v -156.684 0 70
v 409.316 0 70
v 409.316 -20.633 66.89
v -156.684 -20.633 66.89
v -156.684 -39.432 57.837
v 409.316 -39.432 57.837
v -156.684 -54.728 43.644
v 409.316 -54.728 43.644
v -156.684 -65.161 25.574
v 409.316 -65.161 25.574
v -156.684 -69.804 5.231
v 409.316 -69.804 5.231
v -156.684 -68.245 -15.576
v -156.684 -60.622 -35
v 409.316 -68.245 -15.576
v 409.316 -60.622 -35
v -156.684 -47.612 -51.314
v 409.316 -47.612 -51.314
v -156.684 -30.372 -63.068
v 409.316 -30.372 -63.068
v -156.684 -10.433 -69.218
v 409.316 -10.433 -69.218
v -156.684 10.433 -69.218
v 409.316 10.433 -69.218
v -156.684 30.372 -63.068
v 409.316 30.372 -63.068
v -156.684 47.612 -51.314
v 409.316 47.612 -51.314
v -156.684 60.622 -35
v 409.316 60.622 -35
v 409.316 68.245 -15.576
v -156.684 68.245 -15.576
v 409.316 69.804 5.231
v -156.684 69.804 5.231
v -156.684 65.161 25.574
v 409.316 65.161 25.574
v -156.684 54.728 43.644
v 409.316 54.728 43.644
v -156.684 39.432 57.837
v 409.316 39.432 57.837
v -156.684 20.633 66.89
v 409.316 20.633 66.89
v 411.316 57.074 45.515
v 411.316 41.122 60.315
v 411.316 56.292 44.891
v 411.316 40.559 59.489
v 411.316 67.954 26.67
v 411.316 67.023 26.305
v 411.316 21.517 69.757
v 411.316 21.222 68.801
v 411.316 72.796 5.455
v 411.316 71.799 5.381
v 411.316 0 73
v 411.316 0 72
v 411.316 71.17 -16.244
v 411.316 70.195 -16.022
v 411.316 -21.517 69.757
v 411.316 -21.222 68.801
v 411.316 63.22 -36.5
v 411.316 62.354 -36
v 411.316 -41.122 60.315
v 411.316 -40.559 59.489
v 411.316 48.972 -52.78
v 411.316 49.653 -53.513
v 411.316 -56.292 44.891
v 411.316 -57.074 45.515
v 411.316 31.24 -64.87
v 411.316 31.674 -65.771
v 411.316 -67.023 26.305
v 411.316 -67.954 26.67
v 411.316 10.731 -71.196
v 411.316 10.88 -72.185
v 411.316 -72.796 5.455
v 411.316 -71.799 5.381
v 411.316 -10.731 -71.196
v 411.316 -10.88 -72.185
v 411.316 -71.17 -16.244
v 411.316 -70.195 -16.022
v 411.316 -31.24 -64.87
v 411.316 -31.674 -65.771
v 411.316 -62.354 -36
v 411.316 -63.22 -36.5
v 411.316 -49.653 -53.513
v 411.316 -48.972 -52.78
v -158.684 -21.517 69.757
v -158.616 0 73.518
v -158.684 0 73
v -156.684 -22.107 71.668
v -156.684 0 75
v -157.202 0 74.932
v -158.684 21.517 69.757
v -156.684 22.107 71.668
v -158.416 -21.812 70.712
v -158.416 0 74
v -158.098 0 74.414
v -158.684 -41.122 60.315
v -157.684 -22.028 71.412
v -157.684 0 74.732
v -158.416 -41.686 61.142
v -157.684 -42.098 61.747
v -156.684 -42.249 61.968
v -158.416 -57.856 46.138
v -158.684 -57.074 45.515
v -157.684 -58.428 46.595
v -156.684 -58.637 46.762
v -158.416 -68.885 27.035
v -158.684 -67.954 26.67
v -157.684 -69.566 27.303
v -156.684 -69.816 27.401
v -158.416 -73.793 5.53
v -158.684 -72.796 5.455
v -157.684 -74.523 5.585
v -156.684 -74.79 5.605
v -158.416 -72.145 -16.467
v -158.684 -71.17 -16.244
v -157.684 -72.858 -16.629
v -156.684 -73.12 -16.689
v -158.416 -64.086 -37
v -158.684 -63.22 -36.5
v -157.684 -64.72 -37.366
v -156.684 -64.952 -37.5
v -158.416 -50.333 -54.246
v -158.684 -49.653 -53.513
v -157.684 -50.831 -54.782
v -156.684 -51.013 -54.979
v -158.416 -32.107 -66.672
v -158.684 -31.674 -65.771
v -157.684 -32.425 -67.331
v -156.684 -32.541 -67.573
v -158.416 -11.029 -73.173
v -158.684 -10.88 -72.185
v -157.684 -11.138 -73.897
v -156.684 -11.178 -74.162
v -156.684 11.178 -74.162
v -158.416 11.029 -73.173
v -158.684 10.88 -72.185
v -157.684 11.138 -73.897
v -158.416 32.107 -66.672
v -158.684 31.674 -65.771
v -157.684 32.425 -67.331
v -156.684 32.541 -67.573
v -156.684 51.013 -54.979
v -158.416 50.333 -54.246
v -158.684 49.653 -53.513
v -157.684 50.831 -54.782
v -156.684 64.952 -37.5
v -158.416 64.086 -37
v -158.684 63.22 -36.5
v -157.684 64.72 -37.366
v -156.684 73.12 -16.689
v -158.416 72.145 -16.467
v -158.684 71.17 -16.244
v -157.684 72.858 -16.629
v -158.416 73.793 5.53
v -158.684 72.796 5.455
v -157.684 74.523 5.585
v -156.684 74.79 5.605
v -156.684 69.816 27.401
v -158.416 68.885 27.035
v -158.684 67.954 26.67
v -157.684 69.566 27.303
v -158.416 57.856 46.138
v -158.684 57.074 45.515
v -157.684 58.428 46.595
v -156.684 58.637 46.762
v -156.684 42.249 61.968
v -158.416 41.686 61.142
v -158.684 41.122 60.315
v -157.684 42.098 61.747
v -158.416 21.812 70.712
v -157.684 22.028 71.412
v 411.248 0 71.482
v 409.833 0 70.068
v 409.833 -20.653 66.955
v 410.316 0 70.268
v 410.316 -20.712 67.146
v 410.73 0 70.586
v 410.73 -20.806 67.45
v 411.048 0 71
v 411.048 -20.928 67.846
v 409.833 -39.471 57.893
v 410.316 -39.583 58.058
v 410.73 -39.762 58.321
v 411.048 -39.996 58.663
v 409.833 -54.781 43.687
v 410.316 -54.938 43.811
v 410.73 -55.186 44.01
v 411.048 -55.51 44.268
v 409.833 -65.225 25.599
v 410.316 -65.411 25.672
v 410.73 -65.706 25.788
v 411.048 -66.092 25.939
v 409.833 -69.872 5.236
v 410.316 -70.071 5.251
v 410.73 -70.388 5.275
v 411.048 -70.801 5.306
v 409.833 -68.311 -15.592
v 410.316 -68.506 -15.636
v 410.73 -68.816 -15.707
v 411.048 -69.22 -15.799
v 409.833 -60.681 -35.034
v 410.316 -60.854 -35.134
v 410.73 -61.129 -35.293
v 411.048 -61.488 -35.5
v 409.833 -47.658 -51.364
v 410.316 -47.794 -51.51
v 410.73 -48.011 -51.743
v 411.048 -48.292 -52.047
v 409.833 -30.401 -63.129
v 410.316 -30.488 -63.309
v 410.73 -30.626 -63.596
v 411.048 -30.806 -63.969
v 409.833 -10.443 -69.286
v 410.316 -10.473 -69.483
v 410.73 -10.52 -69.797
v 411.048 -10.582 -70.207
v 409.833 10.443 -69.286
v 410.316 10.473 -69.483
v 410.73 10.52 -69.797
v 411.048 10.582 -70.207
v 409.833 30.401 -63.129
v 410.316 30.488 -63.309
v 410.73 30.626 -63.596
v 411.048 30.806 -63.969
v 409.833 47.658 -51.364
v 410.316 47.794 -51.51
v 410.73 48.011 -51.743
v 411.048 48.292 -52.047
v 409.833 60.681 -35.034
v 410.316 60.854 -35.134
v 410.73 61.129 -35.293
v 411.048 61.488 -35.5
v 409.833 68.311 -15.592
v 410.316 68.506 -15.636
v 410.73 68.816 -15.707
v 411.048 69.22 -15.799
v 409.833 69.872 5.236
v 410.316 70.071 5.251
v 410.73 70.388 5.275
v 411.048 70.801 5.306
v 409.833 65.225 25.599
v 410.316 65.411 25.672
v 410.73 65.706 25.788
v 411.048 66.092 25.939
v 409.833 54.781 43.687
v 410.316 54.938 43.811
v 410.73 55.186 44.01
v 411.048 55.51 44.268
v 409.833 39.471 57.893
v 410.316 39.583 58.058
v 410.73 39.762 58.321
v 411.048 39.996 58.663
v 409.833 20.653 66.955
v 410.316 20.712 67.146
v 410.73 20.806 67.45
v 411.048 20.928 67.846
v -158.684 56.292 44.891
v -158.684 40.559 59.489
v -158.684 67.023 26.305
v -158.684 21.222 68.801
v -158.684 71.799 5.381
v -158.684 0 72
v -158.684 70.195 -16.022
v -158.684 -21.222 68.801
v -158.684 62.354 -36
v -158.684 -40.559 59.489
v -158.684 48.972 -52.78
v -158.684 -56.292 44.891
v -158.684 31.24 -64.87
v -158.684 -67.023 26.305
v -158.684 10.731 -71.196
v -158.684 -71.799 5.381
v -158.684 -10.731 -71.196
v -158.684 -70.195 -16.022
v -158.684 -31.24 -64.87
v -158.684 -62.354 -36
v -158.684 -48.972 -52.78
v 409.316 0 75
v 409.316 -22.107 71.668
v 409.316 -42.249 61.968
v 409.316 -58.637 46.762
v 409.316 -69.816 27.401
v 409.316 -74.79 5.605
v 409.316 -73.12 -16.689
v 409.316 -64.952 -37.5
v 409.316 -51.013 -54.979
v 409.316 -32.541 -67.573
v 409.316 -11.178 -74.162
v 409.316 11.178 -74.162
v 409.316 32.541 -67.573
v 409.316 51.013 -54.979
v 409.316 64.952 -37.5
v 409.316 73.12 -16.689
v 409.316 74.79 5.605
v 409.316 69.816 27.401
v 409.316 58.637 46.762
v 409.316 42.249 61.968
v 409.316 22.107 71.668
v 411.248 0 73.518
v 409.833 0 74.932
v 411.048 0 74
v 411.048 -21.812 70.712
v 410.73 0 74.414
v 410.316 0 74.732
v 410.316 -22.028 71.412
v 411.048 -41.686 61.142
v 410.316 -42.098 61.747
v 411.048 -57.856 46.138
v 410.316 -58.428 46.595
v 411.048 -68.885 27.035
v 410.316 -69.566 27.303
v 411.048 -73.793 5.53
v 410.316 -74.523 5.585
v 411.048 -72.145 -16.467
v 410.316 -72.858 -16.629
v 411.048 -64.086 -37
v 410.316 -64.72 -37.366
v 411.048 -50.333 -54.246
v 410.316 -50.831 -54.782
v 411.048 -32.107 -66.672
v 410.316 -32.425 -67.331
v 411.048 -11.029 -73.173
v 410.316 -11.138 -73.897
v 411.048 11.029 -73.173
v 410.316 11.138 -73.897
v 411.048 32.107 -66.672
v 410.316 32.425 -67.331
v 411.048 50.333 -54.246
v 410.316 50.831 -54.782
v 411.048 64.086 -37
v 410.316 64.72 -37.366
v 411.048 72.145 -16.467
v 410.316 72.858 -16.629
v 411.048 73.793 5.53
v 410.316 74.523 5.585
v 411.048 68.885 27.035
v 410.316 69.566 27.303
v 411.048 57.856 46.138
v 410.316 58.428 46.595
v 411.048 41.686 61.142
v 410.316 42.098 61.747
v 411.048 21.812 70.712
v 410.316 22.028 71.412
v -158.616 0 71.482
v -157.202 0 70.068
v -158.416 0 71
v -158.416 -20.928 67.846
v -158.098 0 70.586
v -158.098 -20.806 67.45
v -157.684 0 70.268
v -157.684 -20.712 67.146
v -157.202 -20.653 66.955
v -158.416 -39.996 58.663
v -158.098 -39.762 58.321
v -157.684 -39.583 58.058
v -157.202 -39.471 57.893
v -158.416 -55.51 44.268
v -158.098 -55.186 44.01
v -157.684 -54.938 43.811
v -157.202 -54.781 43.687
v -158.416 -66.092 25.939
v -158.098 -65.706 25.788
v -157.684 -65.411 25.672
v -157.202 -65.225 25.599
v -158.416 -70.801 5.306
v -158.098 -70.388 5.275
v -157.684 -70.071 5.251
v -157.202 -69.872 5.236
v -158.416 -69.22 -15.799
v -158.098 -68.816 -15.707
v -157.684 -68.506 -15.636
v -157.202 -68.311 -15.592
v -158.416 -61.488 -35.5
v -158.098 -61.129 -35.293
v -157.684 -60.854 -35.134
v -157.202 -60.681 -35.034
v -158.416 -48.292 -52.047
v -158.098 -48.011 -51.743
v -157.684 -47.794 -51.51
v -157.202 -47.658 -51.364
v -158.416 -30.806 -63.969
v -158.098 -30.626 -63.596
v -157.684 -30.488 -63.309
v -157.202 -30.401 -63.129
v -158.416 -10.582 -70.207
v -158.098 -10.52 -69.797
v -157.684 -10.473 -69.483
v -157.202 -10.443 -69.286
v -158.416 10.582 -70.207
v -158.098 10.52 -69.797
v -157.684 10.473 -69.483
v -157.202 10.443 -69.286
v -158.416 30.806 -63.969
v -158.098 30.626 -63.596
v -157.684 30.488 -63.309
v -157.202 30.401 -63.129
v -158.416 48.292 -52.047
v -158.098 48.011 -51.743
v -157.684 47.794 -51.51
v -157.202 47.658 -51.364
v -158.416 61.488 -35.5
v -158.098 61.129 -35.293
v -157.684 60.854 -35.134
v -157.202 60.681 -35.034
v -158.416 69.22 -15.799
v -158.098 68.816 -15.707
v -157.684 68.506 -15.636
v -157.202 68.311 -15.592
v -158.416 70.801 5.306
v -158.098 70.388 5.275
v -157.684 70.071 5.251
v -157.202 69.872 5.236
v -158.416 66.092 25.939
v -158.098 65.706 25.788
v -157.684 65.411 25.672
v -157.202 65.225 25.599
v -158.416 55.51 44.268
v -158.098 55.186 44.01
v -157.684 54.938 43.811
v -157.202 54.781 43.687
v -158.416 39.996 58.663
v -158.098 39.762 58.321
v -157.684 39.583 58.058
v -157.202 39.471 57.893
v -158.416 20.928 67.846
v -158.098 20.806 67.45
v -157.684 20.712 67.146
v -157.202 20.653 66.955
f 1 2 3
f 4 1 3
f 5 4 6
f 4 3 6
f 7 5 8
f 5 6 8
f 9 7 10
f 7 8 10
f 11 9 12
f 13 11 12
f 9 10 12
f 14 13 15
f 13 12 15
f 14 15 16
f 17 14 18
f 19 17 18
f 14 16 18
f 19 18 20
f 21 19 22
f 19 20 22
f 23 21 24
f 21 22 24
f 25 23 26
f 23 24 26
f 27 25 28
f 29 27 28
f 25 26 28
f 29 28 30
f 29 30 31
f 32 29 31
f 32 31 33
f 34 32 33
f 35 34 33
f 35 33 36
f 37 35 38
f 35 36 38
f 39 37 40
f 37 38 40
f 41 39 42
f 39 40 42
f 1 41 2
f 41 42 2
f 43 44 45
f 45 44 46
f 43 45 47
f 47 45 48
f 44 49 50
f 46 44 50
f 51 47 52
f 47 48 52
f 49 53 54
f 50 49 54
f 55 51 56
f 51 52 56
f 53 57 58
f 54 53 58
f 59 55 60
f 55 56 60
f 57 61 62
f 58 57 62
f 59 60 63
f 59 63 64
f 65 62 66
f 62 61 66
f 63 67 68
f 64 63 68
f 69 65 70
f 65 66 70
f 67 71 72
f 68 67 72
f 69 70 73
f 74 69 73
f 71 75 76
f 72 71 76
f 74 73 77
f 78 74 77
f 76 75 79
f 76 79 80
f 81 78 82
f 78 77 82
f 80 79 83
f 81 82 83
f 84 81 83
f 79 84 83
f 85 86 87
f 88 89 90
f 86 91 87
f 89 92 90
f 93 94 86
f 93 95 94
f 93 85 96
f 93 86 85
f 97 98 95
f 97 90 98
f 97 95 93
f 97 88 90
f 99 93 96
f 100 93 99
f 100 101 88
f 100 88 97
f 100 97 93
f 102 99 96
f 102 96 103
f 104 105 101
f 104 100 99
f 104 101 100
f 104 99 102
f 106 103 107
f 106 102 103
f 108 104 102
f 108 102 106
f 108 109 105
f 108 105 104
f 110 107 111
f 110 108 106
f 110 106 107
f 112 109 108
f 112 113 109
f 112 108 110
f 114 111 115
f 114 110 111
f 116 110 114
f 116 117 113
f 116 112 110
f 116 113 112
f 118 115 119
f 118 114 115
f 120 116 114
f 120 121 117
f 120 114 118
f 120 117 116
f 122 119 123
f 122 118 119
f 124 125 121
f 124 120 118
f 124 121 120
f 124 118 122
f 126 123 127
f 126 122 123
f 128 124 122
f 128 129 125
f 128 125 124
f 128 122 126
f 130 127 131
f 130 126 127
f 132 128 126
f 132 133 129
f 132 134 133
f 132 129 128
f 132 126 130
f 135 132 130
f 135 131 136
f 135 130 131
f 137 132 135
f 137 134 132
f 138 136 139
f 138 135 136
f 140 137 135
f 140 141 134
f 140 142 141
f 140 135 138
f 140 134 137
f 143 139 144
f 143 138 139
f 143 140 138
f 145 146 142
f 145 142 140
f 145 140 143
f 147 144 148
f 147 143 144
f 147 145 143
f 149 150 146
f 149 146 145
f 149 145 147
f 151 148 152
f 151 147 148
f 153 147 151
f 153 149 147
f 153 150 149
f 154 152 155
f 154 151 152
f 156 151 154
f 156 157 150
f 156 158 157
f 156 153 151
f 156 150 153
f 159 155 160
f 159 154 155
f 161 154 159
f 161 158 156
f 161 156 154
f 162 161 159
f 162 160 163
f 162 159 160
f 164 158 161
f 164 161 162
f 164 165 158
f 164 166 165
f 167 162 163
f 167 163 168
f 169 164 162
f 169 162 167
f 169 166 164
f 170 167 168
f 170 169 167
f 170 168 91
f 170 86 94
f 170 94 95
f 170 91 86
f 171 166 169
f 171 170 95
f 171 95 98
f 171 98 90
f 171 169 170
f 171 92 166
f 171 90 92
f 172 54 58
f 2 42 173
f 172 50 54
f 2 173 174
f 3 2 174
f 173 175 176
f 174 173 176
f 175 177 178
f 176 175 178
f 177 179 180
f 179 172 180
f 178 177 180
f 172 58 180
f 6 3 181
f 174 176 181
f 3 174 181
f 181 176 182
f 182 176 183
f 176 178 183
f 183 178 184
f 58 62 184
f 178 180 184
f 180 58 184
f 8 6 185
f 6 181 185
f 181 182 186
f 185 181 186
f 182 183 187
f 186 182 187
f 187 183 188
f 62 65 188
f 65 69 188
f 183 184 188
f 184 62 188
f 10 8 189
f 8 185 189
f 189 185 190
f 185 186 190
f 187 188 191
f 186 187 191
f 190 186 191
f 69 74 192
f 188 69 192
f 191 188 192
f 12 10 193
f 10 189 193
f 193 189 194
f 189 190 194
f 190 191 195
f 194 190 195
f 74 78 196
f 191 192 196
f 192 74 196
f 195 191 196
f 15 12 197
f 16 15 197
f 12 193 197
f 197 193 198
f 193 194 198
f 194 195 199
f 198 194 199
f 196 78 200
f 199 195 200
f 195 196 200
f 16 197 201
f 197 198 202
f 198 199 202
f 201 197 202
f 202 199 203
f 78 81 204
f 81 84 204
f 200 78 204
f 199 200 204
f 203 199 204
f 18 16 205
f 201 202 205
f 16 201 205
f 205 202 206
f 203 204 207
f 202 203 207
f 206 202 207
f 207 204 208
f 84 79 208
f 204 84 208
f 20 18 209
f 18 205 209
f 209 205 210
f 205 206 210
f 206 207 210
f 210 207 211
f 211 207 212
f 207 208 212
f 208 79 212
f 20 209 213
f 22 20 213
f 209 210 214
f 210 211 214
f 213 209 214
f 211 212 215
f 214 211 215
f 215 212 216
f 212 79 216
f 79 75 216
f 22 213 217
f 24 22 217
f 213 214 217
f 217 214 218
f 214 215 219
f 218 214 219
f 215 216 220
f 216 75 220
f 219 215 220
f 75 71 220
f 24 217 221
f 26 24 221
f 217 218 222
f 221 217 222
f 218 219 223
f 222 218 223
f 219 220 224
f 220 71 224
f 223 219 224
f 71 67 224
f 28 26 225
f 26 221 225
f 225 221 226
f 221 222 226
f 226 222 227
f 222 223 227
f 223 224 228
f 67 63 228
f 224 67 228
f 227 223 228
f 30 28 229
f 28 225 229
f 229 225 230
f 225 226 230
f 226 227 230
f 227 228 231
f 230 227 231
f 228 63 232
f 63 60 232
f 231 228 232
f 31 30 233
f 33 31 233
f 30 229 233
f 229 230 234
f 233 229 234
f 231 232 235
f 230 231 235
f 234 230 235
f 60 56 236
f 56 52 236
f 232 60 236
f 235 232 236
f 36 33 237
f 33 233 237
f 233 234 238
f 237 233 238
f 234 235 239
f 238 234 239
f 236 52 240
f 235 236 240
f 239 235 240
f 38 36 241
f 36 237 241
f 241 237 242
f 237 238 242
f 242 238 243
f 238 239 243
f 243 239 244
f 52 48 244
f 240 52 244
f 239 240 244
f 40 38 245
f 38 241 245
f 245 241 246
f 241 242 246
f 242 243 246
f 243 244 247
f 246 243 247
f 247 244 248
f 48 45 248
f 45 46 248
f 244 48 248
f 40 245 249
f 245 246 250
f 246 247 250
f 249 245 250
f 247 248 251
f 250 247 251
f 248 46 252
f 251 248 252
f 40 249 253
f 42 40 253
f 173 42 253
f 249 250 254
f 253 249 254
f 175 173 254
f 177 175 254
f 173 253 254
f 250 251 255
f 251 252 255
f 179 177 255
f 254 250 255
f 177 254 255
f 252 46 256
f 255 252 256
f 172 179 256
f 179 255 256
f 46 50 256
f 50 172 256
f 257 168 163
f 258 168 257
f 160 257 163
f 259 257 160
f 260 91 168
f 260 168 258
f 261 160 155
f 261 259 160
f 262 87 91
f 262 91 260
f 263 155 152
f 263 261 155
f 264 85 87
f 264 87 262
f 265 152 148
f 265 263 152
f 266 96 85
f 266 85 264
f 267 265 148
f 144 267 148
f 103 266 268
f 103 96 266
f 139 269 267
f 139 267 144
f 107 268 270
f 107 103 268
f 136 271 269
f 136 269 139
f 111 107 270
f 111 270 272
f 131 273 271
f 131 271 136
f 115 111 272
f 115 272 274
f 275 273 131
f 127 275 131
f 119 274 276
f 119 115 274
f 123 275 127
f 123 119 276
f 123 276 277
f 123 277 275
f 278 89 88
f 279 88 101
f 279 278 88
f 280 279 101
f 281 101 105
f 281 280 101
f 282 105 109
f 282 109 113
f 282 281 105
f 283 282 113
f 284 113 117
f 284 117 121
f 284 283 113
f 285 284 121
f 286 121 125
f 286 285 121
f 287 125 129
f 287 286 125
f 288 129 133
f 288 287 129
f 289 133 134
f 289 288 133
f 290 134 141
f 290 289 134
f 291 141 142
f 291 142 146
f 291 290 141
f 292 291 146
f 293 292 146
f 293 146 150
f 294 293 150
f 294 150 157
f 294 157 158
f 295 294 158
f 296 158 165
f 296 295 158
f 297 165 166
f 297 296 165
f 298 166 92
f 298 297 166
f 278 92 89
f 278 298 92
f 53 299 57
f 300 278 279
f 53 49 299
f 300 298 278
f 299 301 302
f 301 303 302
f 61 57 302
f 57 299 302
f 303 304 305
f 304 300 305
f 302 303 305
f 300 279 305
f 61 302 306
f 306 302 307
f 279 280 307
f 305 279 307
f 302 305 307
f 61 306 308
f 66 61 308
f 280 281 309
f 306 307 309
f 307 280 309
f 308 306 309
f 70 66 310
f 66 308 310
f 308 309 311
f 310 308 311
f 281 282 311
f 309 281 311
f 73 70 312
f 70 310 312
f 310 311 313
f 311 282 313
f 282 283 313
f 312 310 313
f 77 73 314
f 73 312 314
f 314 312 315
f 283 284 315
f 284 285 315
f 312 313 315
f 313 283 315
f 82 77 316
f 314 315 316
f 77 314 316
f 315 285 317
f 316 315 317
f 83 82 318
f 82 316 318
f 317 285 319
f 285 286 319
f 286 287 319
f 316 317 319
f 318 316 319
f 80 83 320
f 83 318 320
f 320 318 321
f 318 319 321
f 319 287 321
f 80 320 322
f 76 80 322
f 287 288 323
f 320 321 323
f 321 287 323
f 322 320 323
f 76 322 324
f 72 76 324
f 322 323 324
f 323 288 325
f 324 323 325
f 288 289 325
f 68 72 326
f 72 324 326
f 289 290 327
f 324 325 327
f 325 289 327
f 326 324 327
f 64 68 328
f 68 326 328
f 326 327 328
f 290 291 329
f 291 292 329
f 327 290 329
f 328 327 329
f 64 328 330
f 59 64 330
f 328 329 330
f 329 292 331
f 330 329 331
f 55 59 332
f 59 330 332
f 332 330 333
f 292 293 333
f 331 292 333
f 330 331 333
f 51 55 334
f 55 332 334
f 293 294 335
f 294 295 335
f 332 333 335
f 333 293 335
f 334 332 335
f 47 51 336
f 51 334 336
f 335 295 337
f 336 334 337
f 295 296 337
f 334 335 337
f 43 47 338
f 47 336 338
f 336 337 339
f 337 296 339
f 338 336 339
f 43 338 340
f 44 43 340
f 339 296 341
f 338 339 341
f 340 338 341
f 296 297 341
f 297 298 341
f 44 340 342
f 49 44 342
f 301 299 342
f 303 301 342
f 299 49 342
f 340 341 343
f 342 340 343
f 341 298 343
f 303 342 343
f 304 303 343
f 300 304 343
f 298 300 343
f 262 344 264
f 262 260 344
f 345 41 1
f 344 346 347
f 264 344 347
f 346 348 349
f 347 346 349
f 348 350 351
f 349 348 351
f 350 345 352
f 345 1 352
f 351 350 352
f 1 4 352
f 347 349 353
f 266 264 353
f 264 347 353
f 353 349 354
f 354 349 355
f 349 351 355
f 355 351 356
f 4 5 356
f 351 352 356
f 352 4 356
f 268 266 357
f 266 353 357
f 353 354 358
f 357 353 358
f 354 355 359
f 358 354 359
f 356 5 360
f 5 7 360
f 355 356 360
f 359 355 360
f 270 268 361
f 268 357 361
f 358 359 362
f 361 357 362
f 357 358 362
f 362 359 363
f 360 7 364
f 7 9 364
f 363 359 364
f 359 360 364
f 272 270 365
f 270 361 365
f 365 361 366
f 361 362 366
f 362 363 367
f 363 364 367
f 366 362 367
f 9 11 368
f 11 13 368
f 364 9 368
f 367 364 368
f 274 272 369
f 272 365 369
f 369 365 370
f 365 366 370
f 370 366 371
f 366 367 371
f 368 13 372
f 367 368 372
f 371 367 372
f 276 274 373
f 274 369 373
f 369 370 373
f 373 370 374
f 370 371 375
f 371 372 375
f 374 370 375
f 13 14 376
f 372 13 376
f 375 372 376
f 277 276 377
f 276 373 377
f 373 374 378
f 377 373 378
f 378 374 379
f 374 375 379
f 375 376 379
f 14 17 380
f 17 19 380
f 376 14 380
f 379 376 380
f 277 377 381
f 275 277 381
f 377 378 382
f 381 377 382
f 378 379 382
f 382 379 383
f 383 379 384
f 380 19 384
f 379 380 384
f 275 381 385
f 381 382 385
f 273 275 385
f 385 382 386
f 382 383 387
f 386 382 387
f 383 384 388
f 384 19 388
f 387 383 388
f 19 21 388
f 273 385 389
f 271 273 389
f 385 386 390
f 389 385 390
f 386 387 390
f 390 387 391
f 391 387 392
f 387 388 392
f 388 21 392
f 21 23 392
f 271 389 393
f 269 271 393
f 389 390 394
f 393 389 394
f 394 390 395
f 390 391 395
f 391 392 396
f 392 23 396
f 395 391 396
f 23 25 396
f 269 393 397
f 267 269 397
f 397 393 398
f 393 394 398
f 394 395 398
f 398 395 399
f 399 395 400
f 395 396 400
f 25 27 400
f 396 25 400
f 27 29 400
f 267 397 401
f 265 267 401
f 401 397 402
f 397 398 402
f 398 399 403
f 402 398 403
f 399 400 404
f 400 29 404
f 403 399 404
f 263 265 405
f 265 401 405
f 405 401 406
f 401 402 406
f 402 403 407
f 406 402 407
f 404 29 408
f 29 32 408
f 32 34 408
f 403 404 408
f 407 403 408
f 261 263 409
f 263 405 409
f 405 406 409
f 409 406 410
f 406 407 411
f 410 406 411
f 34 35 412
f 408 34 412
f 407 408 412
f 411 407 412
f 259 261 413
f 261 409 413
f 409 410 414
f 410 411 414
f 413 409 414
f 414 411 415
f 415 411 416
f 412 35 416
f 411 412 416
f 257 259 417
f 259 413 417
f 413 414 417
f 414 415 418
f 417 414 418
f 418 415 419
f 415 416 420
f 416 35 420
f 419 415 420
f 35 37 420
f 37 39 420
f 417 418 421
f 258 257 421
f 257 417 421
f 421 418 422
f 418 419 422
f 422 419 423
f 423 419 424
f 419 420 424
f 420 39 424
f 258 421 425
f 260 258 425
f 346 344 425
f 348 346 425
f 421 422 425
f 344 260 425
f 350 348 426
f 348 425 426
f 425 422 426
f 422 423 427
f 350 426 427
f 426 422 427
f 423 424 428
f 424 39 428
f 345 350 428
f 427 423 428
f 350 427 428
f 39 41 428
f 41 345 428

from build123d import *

# Parameters (mm, degrees)
SZKIC1_W        = 570
SZKIC1_H        = 5
ZAOKR_GLENIE1_R = 2


with BuildPart() as part:
    # Szkic1 → Obrót1 (revolve)
    with BuildSketch(Plane.XY, mode=Mode.PRIVATE) as obr_t1_sk:
        with Locations((126.315789474, 72.5)):
            Rectangle(SZKIC1_W, SZKIC1_H)
    revolve(obr_t1_sk.sketch.rotate(Axis((0, 0, 0), (1, 0, 0)), 90), axis=Axis((0, 0, 0), (1, 0, 0)))

    # Zaokrąglenie1
    zaokr_glenie1_edges = [part.edges().sort_by_distance(p)[0] for p in [
        (-158.684210526, 0, -75),
        (411.315789474, 0, -75),
        (411.315789474, 0, -70),
        (-158.684210526, 0, -70),
    ]]
    fillet(zaokr_glenie1_edges, radius=ZAOKR_GLENIE1_R)


solid = part.part
